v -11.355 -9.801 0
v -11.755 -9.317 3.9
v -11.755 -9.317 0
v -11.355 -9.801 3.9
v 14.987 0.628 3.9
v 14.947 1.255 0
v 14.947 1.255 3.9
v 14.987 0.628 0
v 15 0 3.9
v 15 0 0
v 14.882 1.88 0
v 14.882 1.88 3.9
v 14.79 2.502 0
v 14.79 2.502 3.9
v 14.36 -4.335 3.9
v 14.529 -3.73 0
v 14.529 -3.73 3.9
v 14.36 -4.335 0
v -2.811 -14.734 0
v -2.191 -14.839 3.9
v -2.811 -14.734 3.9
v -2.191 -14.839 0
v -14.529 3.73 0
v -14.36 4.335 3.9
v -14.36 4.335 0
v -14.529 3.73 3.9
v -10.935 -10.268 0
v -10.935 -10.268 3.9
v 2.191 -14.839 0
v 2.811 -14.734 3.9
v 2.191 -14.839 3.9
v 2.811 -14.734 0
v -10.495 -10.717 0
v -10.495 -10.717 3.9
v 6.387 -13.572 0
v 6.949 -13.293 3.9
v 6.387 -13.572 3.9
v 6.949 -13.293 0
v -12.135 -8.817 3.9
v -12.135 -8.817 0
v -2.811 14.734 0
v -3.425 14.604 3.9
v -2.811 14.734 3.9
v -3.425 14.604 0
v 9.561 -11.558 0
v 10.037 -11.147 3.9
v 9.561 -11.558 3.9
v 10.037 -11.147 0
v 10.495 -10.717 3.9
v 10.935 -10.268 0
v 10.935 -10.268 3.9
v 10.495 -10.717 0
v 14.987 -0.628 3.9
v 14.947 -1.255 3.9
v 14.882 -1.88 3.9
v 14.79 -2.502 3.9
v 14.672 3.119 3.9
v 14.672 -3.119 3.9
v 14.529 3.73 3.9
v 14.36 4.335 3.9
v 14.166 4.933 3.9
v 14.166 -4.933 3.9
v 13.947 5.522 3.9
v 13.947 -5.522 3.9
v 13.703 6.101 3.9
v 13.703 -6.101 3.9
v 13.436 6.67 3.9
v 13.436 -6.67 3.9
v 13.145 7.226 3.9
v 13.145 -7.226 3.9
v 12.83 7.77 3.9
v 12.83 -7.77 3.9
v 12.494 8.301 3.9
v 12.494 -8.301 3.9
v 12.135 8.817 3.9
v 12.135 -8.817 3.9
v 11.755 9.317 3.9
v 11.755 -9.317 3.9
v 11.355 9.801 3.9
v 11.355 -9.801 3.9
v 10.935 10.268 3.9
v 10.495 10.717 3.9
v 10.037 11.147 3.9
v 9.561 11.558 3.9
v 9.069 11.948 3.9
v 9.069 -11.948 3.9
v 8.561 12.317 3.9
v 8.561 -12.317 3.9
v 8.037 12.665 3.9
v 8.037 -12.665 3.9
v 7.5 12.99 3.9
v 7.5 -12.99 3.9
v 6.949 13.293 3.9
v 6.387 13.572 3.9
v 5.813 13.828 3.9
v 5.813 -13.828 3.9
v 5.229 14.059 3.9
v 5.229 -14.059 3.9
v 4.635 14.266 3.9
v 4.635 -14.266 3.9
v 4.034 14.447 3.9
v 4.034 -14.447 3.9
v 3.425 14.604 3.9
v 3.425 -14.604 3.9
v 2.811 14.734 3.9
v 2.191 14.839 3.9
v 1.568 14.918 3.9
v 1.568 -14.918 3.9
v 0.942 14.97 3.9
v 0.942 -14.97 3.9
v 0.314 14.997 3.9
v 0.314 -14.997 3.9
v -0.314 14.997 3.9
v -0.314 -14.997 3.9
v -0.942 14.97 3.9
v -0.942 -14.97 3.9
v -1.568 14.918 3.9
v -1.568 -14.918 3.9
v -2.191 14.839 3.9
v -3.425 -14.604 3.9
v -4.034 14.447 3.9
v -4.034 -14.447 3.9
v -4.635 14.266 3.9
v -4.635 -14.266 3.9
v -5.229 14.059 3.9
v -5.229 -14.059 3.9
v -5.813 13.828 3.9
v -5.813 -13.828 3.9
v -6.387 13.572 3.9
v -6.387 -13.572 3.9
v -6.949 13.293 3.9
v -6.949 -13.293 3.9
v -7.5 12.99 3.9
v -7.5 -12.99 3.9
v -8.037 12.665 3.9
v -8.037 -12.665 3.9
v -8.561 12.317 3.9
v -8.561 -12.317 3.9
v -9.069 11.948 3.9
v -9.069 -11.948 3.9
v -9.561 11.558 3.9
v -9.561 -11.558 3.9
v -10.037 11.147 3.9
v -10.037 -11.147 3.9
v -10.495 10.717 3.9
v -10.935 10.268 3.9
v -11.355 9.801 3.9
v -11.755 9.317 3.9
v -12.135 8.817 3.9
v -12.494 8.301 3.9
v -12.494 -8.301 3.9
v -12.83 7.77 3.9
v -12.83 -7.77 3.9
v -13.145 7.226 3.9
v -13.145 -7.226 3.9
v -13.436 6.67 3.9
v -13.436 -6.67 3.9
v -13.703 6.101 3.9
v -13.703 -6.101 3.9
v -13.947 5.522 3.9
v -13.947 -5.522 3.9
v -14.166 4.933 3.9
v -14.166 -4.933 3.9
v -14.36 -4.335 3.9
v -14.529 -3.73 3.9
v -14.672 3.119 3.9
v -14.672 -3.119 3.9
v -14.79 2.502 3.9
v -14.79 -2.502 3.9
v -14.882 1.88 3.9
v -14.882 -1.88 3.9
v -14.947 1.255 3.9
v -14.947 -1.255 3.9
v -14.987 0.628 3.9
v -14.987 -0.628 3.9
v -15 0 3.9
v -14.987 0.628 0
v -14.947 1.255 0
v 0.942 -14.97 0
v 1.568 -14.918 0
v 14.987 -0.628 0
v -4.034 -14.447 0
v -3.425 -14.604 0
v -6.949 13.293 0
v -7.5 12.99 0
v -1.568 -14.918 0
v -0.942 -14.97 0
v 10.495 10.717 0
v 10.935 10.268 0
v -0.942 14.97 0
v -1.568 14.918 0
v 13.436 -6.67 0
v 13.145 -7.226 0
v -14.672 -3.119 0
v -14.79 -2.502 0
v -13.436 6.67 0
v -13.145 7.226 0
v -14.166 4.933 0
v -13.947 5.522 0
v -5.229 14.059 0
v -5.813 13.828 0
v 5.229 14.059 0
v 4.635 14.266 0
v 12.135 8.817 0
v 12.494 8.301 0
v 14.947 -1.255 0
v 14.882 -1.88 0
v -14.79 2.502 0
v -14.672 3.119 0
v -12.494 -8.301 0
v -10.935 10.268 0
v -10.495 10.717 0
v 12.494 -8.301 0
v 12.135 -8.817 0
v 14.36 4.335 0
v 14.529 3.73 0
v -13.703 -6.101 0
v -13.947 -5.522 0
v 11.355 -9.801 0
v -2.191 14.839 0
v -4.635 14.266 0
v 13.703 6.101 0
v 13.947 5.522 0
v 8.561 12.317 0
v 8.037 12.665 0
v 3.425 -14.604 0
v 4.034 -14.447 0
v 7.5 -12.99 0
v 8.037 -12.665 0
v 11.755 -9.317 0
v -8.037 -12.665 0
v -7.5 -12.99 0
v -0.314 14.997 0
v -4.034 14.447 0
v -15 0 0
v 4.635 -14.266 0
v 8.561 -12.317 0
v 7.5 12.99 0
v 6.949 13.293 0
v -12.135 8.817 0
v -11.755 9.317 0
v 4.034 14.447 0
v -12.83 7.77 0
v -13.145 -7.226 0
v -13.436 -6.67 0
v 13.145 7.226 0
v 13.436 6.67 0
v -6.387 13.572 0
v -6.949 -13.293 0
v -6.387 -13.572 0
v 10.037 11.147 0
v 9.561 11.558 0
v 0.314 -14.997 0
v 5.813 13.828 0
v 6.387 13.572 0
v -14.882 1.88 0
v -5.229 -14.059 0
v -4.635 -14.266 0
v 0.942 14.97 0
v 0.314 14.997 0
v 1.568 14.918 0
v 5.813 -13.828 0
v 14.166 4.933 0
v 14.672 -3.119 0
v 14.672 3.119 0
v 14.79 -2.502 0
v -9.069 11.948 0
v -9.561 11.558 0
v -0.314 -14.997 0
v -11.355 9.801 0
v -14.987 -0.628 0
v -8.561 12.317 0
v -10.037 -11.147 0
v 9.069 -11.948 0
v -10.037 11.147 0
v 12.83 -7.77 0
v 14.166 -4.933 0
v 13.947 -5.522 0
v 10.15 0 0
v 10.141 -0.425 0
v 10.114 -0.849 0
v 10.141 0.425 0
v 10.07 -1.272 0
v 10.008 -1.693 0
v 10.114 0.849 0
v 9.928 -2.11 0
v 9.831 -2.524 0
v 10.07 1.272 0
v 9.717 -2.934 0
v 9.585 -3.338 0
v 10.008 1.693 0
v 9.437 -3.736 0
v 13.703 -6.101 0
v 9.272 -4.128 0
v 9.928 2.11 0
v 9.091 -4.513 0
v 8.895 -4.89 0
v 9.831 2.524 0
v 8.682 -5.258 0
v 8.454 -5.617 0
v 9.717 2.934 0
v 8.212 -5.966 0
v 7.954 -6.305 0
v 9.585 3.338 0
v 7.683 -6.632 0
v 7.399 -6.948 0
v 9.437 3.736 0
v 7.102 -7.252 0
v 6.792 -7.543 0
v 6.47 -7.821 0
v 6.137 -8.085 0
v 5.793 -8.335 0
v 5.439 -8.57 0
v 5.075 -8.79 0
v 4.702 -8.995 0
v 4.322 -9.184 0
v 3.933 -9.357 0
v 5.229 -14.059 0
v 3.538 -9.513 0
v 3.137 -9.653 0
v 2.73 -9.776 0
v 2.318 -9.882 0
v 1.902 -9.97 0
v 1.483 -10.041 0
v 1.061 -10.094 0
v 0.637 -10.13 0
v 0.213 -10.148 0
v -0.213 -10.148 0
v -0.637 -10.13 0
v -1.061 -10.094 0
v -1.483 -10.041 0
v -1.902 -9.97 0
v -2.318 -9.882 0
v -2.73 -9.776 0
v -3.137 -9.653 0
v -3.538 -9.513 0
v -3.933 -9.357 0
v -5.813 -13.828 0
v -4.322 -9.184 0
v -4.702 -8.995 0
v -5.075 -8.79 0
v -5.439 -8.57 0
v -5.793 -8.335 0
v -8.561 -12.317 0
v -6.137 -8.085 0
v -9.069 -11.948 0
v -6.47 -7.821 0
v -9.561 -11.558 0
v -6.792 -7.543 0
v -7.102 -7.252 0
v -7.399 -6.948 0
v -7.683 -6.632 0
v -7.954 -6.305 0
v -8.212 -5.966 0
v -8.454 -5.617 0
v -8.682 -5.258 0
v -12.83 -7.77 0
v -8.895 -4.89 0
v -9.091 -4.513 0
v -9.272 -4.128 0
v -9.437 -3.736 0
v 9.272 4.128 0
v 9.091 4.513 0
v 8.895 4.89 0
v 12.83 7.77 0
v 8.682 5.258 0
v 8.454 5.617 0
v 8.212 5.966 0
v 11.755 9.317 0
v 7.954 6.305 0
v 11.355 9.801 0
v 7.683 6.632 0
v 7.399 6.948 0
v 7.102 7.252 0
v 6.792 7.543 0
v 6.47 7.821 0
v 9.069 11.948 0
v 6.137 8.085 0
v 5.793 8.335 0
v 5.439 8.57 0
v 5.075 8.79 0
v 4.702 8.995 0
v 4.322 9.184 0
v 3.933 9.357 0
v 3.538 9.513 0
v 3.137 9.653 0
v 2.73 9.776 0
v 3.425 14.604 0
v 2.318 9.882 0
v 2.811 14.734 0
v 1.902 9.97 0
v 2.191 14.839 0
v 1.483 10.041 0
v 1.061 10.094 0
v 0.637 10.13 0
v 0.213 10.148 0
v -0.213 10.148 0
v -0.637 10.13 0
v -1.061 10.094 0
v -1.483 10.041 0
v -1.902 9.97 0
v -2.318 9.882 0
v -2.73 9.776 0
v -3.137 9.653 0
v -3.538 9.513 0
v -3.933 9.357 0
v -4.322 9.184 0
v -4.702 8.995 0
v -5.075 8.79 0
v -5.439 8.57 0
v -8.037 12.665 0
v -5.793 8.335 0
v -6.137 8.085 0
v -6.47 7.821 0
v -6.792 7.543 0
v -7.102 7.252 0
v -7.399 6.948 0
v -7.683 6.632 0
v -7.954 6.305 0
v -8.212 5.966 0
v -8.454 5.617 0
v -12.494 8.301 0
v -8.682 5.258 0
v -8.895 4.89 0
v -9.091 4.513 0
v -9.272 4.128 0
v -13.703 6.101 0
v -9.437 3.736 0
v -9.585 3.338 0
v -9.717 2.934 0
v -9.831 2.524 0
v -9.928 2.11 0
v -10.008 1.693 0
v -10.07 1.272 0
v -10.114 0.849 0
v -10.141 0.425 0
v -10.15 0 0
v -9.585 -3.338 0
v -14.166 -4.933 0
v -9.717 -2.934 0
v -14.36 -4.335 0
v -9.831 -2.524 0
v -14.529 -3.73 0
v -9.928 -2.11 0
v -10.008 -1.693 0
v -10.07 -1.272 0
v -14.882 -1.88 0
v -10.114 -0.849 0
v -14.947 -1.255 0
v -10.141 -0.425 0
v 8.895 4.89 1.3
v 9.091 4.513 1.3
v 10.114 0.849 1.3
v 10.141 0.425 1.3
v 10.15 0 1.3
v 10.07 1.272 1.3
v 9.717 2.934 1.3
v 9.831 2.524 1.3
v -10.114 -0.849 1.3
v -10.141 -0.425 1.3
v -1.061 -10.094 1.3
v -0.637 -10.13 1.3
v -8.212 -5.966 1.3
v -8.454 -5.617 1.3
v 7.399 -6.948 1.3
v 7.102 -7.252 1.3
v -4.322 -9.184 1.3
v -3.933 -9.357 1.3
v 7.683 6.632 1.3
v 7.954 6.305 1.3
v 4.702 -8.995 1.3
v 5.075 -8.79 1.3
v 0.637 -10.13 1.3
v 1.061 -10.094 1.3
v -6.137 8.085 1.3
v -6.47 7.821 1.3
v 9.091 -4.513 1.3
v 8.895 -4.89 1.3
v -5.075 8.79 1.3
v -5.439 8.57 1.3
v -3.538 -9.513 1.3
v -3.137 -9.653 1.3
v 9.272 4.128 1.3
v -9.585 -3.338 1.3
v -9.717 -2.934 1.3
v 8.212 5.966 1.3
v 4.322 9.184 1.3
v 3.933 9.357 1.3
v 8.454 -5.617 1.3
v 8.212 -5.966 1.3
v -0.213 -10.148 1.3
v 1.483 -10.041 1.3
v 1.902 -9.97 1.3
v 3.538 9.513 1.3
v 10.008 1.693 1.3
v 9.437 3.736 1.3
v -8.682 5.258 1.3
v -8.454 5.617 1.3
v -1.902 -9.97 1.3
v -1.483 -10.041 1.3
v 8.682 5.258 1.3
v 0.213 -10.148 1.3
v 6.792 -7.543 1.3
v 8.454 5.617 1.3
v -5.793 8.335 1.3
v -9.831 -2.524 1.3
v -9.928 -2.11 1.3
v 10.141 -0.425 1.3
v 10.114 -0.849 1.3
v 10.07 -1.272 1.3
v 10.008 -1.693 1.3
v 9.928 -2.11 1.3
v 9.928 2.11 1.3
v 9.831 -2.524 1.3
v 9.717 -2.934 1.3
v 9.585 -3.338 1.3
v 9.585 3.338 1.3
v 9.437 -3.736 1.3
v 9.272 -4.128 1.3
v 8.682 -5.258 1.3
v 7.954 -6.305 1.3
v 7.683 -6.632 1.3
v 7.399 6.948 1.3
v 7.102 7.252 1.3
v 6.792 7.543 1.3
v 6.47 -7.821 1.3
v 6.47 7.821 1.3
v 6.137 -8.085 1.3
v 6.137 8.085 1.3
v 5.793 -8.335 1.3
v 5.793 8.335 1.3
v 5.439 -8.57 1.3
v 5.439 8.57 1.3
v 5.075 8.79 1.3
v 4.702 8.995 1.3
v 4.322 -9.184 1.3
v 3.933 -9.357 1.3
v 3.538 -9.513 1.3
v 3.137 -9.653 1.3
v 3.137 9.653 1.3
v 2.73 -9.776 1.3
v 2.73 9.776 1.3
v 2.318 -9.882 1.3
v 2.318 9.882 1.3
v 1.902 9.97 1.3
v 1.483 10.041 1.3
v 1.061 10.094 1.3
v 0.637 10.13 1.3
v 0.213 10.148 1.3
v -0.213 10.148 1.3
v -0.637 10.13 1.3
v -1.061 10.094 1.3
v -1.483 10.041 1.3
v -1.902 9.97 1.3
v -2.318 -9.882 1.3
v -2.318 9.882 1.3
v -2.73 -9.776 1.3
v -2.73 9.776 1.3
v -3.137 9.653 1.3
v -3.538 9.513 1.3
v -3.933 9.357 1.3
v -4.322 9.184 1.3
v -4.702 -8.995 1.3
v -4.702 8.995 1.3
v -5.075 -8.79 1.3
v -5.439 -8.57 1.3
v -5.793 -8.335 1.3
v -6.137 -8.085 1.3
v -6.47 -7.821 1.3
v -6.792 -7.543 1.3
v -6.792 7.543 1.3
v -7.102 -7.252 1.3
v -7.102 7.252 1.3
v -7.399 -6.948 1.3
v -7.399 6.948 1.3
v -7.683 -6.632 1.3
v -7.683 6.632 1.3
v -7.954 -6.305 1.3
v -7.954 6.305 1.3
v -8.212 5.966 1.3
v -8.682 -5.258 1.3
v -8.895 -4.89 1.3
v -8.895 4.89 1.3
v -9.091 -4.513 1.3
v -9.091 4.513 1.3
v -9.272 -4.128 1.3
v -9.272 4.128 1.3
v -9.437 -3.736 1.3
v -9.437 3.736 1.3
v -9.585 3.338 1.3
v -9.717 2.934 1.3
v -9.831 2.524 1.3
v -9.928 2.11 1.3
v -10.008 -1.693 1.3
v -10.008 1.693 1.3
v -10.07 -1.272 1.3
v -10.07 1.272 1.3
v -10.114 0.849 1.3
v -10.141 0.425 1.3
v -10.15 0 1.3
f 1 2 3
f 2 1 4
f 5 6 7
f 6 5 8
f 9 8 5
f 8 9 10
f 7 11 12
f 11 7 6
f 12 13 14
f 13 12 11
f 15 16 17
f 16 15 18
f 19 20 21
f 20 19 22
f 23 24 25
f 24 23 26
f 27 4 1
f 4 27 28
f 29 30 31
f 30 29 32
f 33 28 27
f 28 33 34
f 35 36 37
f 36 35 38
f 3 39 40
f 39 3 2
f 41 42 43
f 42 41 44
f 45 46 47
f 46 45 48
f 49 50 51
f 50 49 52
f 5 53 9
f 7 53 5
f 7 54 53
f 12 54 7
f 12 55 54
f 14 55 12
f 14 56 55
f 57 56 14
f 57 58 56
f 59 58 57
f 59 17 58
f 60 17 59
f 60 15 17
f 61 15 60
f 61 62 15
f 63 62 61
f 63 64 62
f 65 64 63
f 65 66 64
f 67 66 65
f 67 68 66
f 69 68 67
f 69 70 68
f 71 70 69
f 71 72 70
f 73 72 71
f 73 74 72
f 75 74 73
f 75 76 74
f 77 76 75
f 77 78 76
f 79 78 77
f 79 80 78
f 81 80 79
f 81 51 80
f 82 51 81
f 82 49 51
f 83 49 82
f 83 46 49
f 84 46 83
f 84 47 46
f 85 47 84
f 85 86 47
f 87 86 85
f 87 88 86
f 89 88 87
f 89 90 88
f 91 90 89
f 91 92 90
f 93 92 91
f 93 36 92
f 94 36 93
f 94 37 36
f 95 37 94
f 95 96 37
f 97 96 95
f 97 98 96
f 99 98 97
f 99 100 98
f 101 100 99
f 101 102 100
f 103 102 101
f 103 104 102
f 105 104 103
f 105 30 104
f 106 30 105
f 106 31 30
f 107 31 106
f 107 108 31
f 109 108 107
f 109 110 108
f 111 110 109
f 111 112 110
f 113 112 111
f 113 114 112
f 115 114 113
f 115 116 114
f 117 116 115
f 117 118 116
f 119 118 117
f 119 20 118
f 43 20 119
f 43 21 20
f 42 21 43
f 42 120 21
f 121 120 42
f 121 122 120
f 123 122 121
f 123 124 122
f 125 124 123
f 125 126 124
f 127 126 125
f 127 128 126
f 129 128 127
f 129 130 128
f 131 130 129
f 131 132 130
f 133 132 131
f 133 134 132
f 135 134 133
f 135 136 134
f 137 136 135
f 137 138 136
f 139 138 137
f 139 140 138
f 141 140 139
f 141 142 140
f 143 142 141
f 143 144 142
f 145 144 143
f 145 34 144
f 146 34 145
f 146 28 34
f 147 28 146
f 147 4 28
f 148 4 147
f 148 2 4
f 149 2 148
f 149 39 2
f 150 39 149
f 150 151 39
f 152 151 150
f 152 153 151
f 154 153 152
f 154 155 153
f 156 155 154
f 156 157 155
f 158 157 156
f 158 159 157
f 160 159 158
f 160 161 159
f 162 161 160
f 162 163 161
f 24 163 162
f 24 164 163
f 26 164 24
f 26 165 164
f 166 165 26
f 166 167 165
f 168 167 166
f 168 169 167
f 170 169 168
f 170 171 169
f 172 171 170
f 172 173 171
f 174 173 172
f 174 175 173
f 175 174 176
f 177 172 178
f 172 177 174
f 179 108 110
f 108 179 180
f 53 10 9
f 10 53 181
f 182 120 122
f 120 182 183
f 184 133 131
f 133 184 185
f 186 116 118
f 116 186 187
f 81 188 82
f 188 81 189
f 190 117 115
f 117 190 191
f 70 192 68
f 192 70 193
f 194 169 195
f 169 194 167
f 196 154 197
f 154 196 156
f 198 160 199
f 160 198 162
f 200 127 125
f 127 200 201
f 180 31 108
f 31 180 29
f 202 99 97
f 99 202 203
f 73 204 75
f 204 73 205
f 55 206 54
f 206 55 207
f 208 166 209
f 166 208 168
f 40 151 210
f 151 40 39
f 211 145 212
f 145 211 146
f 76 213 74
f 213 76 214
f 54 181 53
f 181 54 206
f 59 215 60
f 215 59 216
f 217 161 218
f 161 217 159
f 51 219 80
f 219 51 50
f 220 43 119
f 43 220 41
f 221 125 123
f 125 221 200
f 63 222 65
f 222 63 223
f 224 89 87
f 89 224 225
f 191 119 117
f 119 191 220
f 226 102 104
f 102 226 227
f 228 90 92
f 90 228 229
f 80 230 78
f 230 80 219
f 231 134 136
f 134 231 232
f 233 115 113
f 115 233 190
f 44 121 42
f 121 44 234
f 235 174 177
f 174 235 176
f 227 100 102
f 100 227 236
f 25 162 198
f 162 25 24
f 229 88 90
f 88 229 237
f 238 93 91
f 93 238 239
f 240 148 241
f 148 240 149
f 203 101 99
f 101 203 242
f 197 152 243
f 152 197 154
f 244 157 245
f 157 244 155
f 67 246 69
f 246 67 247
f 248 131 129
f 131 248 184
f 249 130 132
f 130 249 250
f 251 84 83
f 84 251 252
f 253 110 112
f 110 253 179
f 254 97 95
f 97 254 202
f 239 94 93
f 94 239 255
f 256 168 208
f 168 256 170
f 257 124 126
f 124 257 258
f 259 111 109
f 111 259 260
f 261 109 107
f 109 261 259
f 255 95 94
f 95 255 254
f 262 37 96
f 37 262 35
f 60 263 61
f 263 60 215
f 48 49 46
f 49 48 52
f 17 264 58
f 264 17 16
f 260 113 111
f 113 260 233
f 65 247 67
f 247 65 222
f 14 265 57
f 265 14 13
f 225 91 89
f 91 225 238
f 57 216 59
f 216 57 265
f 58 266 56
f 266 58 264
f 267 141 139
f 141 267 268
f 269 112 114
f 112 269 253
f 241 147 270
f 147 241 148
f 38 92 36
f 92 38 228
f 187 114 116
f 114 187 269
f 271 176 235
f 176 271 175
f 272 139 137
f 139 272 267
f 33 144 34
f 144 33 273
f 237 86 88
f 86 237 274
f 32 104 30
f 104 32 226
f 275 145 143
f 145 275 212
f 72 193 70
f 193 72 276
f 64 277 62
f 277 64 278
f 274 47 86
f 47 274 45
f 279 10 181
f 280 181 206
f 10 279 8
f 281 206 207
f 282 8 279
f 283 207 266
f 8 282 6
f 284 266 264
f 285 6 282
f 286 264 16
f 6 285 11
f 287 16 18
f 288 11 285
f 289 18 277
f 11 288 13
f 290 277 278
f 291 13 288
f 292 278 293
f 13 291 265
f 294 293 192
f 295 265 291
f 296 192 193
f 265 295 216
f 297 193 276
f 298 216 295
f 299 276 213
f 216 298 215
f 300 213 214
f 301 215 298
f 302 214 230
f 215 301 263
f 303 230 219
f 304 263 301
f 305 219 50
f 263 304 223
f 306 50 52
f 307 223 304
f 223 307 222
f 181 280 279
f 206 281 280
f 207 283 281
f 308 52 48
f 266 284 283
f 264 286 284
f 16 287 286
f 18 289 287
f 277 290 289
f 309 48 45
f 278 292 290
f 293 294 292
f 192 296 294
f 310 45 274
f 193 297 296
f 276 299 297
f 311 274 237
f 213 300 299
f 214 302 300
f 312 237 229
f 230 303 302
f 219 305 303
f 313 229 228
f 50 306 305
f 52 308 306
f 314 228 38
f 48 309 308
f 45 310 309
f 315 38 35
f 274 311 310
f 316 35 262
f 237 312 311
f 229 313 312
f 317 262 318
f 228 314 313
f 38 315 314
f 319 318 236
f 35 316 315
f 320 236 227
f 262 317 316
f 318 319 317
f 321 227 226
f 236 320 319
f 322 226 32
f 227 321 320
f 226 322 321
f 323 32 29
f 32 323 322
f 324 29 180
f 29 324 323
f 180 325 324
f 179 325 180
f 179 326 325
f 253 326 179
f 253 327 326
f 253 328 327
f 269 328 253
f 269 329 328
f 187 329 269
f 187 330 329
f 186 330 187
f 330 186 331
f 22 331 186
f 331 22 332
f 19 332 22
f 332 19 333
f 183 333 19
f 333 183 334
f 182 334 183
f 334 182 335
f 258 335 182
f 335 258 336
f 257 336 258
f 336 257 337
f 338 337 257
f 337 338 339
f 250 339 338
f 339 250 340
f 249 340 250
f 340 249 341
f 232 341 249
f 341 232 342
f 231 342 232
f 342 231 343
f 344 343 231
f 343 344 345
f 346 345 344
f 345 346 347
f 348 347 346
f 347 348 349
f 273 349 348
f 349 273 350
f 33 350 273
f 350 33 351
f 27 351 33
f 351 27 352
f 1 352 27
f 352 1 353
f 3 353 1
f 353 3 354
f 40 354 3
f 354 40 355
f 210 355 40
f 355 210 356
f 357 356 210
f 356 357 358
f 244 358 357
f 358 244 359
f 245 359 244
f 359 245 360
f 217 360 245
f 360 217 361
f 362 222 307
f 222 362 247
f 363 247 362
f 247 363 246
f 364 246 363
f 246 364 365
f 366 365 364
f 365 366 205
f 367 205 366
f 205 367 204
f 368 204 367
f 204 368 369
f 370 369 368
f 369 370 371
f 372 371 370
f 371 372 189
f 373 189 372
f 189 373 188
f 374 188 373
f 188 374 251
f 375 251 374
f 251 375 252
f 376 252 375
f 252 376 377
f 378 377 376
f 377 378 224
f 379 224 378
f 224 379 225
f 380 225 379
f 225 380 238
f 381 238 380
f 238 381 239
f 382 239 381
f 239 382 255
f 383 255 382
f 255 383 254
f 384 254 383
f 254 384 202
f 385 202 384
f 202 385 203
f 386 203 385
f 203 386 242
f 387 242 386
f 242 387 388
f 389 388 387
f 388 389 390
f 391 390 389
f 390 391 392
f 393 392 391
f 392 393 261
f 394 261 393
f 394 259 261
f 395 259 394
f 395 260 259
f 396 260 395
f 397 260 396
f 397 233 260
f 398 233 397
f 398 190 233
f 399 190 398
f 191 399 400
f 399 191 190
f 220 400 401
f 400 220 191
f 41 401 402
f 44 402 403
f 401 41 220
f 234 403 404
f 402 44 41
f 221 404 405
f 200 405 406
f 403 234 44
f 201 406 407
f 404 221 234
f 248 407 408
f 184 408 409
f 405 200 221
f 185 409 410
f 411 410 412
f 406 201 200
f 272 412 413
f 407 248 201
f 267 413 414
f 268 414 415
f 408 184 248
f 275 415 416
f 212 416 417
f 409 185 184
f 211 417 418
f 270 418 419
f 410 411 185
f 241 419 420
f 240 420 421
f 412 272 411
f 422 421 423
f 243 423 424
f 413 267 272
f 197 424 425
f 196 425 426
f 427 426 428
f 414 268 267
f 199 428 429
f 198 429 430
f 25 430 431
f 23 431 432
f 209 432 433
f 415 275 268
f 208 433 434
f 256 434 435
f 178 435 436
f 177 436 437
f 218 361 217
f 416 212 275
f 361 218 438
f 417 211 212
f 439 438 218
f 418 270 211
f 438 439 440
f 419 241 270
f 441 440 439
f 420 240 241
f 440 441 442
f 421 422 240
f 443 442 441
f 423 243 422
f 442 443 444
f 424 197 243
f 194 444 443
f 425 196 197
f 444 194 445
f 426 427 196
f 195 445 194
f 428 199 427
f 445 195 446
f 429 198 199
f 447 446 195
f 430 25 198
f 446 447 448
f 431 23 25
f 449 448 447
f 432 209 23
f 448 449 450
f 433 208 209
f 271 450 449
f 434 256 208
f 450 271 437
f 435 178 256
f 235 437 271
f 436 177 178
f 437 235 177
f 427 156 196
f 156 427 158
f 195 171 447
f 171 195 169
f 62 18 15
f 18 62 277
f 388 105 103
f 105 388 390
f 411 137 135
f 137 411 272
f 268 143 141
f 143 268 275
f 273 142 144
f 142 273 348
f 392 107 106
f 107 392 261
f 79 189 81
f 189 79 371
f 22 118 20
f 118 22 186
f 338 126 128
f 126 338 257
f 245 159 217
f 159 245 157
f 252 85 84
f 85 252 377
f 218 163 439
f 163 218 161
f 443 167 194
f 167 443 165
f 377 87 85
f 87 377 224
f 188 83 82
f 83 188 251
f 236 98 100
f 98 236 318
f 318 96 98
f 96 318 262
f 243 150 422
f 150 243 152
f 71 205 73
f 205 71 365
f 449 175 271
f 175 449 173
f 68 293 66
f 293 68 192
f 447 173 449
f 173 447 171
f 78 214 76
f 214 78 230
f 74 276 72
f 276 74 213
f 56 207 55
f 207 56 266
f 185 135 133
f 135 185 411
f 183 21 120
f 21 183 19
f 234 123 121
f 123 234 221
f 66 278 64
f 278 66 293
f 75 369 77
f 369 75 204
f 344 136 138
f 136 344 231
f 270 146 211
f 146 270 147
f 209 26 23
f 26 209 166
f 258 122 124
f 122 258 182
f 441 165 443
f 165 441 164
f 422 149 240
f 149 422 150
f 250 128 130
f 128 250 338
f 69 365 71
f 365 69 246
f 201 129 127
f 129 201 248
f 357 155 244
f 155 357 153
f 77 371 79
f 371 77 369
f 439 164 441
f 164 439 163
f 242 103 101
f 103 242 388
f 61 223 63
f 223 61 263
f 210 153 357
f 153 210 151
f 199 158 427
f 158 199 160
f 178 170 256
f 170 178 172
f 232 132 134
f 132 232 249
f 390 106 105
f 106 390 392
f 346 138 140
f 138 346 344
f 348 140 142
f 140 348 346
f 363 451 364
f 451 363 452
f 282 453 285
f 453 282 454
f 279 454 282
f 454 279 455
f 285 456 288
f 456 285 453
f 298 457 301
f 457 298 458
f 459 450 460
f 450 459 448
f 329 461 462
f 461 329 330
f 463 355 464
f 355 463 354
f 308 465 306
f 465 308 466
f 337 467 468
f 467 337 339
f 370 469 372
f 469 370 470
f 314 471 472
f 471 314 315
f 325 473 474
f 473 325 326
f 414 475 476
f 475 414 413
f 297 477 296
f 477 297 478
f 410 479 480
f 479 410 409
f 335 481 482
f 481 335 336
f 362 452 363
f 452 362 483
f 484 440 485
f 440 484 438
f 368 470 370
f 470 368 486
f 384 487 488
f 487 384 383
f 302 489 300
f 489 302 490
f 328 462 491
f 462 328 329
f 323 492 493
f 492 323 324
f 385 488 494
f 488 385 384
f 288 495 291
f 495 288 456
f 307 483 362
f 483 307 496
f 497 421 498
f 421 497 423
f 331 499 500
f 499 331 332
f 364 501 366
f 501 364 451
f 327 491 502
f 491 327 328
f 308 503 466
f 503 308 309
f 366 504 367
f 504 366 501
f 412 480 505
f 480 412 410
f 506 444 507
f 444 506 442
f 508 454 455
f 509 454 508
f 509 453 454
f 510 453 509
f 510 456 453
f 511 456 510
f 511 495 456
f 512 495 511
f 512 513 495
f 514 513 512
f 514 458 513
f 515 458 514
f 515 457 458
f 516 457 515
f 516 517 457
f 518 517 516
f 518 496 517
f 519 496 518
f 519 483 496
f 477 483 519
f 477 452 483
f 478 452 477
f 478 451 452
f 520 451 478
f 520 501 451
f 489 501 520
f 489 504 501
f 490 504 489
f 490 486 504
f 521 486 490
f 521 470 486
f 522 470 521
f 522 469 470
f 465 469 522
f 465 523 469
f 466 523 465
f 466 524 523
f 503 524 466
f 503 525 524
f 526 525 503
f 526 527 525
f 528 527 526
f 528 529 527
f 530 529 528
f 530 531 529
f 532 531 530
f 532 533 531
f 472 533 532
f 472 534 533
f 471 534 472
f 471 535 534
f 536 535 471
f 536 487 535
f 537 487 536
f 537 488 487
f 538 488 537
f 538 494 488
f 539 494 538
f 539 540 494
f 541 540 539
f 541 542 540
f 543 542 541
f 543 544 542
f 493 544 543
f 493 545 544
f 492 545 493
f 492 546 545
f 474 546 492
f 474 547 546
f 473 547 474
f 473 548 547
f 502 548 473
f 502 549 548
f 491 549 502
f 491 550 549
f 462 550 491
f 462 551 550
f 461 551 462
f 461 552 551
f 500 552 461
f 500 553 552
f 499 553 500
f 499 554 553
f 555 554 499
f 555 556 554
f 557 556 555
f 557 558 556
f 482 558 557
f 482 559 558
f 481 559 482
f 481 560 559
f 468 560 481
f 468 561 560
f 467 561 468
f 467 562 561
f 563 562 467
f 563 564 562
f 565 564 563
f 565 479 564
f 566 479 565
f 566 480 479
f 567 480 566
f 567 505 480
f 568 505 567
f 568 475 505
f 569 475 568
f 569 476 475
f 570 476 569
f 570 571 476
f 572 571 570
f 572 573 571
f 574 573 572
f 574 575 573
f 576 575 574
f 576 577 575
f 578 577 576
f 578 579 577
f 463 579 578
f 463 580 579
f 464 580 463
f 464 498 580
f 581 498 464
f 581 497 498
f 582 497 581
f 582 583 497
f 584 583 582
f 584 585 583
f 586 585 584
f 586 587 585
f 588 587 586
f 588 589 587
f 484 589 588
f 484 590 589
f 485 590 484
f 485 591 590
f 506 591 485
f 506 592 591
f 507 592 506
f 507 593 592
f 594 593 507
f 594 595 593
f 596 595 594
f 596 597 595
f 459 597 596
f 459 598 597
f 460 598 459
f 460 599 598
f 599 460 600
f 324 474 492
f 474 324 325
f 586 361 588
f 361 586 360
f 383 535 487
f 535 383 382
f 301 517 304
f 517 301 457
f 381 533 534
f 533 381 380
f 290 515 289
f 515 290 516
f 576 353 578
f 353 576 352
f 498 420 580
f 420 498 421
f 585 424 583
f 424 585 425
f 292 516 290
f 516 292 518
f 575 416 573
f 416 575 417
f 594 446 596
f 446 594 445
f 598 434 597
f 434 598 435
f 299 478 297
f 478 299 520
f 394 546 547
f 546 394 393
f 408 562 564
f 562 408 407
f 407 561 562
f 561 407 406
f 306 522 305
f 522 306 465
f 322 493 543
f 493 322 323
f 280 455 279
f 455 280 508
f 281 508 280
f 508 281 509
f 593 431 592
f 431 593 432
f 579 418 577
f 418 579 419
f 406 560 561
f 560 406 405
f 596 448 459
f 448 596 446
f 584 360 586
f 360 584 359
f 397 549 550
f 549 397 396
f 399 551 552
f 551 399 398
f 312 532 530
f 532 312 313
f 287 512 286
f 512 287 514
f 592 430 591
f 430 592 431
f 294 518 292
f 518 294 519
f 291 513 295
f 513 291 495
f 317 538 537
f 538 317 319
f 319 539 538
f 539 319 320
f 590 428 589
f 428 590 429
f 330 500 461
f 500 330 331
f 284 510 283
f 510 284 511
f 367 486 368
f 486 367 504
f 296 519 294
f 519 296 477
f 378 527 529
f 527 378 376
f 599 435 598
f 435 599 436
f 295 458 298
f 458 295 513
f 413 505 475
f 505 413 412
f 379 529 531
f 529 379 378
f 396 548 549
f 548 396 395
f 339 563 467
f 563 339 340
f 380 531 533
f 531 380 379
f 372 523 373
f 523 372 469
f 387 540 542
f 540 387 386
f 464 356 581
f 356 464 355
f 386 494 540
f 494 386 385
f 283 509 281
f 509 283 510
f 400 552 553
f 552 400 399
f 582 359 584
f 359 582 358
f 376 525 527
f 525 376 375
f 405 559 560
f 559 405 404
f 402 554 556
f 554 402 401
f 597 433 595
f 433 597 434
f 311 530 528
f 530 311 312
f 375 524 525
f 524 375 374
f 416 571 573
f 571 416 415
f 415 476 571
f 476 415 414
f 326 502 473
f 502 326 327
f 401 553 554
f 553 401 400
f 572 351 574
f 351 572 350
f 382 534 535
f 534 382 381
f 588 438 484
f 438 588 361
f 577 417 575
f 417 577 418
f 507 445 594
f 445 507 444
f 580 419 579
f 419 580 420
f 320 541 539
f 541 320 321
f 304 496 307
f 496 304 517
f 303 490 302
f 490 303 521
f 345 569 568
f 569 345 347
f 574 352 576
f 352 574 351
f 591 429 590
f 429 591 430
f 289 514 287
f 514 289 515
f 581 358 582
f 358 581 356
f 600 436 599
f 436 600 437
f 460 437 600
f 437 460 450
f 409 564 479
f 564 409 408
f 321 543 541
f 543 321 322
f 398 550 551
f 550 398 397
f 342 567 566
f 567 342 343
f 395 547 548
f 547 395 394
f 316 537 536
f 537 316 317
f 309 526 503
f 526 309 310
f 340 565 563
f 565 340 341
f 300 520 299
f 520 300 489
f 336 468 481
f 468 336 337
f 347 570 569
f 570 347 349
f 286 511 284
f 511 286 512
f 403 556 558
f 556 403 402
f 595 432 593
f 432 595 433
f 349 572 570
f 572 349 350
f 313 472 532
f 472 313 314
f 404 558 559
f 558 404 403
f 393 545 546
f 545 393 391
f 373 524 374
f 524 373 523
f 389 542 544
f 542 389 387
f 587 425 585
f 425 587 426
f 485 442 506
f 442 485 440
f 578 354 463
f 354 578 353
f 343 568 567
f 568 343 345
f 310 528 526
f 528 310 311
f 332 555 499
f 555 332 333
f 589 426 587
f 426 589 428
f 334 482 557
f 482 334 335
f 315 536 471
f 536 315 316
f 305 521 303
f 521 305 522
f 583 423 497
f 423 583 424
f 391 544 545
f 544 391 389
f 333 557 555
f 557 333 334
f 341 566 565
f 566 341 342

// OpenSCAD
$fn = 150;

difference() {
	cylinder(d = 30.0, h = 3.9);
	translate(v = [0, 0, -1]) {
		cylinder(d = 20.3, h = 2.3);
	}
}
